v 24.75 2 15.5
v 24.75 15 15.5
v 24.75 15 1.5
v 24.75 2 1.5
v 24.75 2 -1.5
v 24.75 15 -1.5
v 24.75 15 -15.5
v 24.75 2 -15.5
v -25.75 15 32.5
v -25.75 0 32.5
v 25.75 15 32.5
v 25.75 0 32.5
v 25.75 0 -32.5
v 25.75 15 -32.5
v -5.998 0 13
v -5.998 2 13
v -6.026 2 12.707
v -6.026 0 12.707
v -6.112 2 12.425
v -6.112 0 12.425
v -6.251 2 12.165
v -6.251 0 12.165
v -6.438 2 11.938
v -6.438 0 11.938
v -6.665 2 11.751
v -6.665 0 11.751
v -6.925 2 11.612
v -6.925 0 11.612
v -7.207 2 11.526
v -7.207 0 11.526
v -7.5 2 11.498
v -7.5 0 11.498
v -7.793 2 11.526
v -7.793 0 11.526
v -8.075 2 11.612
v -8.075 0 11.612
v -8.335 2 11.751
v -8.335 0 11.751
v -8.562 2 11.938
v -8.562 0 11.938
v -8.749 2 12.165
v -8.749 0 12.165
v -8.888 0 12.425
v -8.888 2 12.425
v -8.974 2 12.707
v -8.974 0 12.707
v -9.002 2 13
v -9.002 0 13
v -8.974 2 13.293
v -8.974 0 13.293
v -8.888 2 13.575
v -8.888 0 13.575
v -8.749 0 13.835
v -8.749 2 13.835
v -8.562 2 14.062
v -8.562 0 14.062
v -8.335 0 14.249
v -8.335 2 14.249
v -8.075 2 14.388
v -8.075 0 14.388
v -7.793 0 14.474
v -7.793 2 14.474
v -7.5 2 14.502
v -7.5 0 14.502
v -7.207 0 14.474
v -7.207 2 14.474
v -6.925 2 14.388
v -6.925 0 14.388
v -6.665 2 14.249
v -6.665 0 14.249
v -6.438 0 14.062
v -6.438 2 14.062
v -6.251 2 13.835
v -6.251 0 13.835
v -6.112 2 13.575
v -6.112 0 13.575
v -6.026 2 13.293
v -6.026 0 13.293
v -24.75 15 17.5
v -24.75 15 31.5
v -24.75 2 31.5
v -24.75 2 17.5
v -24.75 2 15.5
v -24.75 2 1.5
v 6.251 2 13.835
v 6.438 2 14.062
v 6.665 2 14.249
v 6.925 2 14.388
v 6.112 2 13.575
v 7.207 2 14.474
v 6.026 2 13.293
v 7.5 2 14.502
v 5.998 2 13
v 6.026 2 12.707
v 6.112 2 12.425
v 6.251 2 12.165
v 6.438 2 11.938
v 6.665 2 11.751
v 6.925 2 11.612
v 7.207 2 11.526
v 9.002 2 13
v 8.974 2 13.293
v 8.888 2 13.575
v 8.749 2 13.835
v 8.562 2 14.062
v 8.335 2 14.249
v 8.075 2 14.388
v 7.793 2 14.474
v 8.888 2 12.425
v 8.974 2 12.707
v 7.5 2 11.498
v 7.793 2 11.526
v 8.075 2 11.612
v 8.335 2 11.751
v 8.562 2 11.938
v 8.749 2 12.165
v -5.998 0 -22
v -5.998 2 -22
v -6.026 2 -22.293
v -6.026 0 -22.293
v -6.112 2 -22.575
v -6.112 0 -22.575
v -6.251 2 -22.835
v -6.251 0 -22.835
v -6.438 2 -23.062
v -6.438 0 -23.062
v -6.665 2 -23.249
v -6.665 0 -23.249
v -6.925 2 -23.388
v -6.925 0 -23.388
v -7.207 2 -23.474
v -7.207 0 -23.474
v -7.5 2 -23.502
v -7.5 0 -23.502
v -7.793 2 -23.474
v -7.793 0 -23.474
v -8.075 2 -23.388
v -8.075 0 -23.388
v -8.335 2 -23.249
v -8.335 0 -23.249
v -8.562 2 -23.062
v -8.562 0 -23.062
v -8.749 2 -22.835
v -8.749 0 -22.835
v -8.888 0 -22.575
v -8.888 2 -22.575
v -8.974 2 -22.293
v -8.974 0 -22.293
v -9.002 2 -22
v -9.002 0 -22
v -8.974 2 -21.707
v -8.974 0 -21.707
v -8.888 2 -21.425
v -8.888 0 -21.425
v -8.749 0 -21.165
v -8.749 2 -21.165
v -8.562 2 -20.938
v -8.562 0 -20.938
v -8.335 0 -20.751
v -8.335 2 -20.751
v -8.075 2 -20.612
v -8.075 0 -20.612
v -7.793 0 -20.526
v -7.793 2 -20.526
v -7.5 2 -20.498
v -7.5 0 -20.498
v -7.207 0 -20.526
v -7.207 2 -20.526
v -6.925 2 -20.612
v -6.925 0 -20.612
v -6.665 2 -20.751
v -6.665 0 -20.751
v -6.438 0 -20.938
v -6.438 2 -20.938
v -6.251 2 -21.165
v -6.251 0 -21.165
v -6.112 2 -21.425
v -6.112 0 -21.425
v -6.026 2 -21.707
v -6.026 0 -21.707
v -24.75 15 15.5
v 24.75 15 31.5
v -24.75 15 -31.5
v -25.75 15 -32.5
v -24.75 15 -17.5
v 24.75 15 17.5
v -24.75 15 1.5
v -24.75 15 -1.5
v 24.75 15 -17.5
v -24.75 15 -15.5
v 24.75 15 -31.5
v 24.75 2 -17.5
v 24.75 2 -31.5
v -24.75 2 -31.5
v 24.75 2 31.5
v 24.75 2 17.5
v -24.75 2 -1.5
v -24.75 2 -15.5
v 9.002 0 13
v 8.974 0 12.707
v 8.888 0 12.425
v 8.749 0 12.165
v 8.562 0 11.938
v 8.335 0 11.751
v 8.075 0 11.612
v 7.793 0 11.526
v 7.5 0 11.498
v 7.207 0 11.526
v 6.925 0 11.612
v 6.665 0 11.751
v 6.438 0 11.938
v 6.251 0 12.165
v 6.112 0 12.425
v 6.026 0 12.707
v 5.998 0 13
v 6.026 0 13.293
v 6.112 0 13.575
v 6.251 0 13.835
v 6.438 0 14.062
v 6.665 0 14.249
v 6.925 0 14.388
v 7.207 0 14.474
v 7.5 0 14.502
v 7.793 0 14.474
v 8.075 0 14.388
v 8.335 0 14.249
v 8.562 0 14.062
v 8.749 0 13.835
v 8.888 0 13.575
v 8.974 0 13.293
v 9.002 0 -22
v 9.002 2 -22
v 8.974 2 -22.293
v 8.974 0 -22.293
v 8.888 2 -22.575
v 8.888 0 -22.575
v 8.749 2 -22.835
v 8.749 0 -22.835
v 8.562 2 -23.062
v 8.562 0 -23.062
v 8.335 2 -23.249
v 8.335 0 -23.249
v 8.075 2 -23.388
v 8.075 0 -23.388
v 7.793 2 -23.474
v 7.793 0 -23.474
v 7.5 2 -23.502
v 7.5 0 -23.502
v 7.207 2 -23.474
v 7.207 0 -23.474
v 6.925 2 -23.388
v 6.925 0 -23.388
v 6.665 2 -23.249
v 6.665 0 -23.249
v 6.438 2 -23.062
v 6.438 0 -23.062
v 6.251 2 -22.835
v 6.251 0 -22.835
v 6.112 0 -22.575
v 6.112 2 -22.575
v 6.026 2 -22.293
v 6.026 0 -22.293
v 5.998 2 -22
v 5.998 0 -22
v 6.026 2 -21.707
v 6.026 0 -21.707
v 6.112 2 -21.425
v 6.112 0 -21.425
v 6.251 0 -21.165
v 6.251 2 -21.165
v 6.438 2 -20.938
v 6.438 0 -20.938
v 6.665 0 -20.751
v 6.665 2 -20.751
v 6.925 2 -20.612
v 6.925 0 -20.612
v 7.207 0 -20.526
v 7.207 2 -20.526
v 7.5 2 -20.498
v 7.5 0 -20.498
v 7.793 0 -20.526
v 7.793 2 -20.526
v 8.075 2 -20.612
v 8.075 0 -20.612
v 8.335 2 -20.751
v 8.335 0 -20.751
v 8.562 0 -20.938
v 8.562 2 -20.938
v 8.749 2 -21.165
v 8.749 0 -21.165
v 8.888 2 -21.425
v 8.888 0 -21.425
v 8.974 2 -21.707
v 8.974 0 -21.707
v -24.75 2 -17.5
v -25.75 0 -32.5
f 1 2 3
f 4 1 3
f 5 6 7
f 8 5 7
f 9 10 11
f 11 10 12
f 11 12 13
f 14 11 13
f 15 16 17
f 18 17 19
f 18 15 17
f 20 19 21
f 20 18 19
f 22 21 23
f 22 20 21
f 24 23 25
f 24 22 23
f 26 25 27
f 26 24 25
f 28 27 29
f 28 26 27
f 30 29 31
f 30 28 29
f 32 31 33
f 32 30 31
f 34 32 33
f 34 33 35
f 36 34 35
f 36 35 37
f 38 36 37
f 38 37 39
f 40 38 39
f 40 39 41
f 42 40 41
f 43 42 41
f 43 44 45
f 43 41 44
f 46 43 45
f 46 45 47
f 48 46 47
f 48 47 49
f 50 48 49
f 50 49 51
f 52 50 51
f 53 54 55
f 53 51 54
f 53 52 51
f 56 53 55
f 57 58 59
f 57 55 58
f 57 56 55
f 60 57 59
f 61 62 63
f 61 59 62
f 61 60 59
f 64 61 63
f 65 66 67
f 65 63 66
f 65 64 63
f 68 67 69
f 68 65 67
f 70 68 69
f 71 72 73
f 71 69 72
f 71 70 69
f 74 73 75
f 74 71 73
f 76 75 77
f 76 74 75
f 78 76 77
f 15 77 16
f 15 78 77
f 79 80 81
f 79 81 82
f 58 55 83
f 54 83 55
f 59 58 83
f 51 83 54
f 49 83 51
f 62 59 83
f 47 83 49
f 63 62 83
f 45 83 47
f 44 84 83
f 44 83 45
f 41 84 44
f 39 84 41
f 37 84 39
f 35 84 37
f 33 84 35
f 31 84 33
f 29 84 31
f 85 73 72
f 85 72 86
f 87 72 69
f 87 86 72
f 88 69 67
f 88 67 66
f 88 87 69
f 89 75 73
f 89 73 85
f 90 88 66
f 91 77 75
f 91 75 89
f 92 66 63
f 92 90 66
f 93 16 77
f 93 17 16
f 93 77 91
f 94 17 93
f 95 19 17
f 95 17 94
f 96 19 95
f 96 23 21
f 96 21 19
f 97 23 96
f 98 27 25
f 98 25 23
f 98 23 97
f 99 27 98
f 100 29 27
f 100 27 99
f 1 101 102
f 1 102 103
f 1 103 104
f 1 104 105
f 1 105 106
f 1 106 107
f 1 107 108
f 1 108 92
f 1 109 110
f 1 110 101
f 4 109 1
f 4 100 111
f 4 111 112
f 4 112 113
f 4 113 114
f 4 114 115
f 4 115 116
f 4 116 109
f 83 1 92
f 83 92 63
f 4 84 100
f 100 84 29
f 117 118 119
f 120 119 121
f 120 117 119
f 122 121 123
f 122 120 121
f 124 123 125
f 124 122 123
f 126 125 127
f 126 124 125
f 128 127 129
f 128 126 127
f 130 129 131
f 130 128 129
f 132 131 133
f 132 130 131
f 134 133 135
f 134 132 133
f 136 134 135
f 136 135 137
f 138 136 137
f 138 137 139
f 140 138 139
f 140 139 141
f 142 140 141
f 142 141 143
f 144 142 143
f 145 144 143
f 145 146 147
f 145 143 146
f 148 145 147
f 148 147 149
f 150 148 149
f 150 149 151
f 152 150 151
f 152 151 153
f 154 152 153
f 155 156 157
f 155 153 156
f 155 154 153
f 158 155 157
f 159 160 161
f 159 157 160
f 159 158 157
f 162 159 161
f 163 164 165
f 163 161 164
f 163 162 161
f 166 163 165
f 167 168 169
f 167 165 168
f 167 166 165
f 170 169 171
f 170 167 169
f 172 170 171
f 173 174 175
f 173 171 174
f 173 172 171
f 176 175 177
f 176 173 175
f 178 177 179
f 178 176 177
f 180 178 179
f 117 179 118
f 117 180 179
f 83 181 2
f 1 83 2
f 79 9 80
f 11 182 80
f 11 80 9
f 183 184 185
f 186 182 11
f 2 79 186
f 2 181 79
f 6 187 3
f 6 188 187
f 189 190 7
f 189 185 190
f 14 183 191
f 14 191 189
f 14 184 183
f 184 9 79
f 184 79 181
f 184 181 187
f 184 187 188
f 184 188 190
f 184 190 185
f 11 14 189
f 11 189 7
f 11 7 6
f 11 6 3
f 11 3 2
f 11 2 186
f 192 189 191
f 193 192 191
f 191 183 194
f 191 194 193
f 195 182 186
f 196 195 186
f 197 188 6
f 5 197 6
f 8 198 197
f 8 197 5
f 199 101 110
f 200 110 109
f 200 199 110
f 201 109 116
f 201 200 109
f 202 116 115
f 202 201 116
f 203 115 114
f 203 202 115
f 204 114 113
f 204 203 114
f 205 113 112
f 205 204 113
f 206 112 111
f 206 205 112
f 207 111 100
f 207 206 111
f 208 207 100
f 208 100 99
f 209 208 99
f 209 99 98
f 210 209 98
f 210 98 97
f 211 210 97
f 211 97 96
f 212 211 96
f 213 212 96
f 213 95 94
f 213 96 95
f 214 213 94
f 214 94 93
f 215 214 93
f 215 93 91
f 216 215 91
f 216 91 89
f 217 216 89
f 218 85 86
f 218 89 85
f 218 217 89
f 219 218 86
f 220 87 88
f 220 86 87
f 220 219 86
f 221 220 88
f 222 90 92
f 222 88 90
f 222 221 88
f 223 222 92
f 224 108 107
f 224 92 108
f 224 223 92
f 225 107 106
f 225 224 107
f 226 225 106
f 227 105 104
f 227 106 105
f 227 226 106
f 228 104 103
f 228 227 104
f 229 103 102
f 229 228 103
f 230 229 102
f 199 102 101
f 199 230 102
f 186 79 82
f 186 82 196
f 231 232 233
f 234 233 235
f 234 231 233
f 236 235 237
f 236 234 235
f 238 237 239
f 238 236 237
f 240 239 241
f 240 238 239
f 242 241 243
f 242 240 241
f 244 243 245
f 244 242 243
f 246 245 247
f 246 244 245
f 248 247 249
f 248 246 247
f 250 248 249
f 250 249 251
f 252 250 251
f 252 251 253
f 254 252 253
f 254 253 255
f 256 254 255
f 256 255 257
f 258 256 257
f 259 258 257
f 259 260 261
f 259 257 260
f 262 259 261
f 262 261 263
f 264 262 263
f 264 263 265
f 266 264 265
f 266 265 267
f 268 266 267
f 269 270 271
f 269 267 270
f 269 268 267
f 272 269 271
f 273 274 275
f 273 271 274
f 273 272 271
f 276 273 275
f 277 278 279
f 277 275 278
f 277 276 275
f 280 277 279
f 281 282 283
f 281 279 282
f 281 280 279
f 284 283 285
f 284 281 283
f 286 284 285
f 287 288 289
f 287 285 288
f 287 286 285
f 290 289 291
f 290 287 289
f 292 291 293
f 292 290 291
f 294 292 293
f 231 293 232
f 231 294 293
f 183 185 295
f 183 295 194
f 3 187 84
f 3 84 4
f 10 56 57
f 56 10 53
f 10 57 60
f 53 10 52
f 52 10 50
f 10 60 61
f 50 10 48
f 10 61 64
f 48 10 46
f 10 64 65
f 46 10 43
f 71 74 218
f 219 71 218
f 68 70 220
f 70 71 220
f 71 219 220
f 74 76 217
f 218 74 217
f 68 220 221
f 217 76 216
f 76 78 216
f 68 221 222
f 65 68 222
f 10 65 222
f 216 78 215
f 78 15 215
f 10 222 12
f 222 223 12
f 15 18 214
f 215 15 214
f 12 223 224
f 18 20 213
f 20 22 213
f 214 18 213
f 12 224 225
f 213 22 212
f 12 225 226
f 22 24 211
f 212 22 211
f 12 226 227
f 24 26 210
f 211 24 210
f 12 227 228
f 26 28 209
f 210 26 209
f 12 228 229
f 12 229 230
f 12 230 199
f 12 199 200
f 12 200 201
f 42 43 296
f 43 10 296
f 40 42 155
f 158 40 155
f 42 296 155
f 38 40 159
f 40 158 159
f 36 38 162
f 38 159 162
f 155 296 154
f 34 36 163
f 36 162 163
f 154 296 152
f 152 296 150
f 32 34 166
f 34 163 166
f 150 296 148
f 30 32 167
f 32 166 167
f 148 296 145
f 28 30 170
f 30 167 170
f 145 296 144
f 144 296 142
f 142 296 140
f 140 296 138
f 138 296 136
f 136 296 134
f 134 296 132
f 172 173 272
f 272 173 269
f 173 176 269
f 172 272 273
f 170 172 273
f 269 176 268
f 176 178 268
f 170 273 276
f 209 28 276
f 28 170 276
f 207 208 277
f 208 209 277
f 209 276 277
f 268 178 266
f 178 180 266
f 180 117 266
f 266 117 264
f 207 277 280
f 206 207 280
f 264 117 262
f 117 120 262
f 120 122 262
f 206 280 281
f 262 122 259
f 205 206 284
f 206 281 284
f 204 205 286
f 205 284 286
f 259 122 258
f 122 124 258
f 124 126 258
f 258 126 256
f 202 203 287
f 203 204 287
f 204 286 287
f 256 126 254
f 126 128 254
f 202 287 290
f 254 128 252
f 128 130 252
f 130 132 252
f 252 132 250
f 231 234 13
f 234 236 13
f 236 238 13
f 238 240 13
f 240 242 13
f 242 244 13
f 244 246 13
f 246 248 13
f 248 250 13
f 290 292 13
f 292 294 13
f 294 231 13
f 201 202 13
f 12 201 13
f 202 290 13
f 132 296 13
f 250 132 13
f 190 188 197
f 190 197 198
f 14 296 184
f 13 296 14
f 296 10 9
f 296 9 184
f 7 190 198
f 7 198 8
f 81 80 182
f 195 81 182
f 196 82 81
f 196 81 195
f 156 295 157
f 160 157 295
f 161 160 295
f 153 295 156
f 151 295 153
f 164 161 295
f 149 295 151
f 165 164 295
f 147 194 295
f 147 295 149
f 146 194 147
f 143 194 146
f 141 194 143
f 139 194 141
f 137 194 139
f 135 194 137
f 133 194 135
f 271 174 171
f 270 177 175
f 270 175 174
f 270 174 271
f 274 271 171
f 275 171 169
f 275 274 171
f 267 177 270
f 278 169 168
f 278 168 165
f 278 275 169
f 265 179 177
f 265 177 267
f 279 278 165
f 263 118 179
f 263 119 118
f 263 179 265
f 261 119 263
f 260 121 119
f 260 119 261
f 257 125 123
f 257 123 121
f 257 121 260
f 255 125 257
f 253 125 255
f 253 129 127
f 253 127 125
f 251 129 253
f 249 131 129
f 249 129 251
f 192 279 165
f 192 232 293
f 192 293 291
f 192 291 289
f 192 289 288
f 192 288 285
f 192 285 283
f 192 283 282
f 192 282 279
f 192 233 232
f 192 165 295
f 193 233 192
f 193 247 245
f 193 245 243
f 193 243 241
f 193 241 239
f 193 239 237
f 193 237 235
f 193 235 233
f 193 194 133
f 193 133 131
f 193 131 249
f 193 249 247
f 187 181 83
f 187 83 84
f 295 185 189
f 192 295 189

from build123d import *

# Parameters (mm, degrees)
SKETCH1_W           = 51.5
SKETCH1_H           = 65
SKETCH1_R           = 1.5025
BOSS_EXTRUDE1_DEPTH = 15
SKETCH2_W           = 49.5
SKETCH2_H           = 14
CUT_EXTRUDE1_DEPTH  = 13


with BuildPart() as part:
    # Sketch1 → Boss-Extrude1 (new body)
    with BuildSketch(Plane(origin=(0, 0, 0), x_dir=(1, 0, 0), z_dir=(0, 1, 0))):
        Rectangle(SKETCH1_W, SKETCH1_H)
        with Locations((-7.5, -13)):
            Circle(SKETCH1_R, mode=Mode.SUBTRACT)
        with Locations((7.5, -13)):
            Circle(SKETCH1_R, mode=Mode.SUBTRACT)
        with Locations((7.5, 22)):
            Circle(SKETCH1_R, mode=Mode.SUBTRACT)
        with Locations((-7.5, 22)):
            Circle(SKETCH1_R, mode=Mode.SUBTRACT)
    extrude(amount=BOSS_EXTRUDE1_DEPTH)

    # Sketch2 → Cut-Extrude1 (cut)
    with BuildSketch(Plane(origin=(0, 15, 0), x_dir=(1, 0, 0), z_dir=(0, 1, 0))):
        with Locations((0, -8.5)):
            Rectangle(SKETCH2_W, SKETCH2_H)
        with Locations((0, -24.5)):
            Rectangle(SKETCH2_W, SKETCH2_H)
        with Locations((0, 24.5)):
            Rectangle(SKETCH2_W, SKETCH2_H)
        with Locations((0, 8.5)):
            Rectangle(SKETCH2_W, SKETCH2_H)
    extrude(amount=-CUT_EXTRUDE1_DEPTH, mode=Mode.SUBTRACT)


solid = part.part
